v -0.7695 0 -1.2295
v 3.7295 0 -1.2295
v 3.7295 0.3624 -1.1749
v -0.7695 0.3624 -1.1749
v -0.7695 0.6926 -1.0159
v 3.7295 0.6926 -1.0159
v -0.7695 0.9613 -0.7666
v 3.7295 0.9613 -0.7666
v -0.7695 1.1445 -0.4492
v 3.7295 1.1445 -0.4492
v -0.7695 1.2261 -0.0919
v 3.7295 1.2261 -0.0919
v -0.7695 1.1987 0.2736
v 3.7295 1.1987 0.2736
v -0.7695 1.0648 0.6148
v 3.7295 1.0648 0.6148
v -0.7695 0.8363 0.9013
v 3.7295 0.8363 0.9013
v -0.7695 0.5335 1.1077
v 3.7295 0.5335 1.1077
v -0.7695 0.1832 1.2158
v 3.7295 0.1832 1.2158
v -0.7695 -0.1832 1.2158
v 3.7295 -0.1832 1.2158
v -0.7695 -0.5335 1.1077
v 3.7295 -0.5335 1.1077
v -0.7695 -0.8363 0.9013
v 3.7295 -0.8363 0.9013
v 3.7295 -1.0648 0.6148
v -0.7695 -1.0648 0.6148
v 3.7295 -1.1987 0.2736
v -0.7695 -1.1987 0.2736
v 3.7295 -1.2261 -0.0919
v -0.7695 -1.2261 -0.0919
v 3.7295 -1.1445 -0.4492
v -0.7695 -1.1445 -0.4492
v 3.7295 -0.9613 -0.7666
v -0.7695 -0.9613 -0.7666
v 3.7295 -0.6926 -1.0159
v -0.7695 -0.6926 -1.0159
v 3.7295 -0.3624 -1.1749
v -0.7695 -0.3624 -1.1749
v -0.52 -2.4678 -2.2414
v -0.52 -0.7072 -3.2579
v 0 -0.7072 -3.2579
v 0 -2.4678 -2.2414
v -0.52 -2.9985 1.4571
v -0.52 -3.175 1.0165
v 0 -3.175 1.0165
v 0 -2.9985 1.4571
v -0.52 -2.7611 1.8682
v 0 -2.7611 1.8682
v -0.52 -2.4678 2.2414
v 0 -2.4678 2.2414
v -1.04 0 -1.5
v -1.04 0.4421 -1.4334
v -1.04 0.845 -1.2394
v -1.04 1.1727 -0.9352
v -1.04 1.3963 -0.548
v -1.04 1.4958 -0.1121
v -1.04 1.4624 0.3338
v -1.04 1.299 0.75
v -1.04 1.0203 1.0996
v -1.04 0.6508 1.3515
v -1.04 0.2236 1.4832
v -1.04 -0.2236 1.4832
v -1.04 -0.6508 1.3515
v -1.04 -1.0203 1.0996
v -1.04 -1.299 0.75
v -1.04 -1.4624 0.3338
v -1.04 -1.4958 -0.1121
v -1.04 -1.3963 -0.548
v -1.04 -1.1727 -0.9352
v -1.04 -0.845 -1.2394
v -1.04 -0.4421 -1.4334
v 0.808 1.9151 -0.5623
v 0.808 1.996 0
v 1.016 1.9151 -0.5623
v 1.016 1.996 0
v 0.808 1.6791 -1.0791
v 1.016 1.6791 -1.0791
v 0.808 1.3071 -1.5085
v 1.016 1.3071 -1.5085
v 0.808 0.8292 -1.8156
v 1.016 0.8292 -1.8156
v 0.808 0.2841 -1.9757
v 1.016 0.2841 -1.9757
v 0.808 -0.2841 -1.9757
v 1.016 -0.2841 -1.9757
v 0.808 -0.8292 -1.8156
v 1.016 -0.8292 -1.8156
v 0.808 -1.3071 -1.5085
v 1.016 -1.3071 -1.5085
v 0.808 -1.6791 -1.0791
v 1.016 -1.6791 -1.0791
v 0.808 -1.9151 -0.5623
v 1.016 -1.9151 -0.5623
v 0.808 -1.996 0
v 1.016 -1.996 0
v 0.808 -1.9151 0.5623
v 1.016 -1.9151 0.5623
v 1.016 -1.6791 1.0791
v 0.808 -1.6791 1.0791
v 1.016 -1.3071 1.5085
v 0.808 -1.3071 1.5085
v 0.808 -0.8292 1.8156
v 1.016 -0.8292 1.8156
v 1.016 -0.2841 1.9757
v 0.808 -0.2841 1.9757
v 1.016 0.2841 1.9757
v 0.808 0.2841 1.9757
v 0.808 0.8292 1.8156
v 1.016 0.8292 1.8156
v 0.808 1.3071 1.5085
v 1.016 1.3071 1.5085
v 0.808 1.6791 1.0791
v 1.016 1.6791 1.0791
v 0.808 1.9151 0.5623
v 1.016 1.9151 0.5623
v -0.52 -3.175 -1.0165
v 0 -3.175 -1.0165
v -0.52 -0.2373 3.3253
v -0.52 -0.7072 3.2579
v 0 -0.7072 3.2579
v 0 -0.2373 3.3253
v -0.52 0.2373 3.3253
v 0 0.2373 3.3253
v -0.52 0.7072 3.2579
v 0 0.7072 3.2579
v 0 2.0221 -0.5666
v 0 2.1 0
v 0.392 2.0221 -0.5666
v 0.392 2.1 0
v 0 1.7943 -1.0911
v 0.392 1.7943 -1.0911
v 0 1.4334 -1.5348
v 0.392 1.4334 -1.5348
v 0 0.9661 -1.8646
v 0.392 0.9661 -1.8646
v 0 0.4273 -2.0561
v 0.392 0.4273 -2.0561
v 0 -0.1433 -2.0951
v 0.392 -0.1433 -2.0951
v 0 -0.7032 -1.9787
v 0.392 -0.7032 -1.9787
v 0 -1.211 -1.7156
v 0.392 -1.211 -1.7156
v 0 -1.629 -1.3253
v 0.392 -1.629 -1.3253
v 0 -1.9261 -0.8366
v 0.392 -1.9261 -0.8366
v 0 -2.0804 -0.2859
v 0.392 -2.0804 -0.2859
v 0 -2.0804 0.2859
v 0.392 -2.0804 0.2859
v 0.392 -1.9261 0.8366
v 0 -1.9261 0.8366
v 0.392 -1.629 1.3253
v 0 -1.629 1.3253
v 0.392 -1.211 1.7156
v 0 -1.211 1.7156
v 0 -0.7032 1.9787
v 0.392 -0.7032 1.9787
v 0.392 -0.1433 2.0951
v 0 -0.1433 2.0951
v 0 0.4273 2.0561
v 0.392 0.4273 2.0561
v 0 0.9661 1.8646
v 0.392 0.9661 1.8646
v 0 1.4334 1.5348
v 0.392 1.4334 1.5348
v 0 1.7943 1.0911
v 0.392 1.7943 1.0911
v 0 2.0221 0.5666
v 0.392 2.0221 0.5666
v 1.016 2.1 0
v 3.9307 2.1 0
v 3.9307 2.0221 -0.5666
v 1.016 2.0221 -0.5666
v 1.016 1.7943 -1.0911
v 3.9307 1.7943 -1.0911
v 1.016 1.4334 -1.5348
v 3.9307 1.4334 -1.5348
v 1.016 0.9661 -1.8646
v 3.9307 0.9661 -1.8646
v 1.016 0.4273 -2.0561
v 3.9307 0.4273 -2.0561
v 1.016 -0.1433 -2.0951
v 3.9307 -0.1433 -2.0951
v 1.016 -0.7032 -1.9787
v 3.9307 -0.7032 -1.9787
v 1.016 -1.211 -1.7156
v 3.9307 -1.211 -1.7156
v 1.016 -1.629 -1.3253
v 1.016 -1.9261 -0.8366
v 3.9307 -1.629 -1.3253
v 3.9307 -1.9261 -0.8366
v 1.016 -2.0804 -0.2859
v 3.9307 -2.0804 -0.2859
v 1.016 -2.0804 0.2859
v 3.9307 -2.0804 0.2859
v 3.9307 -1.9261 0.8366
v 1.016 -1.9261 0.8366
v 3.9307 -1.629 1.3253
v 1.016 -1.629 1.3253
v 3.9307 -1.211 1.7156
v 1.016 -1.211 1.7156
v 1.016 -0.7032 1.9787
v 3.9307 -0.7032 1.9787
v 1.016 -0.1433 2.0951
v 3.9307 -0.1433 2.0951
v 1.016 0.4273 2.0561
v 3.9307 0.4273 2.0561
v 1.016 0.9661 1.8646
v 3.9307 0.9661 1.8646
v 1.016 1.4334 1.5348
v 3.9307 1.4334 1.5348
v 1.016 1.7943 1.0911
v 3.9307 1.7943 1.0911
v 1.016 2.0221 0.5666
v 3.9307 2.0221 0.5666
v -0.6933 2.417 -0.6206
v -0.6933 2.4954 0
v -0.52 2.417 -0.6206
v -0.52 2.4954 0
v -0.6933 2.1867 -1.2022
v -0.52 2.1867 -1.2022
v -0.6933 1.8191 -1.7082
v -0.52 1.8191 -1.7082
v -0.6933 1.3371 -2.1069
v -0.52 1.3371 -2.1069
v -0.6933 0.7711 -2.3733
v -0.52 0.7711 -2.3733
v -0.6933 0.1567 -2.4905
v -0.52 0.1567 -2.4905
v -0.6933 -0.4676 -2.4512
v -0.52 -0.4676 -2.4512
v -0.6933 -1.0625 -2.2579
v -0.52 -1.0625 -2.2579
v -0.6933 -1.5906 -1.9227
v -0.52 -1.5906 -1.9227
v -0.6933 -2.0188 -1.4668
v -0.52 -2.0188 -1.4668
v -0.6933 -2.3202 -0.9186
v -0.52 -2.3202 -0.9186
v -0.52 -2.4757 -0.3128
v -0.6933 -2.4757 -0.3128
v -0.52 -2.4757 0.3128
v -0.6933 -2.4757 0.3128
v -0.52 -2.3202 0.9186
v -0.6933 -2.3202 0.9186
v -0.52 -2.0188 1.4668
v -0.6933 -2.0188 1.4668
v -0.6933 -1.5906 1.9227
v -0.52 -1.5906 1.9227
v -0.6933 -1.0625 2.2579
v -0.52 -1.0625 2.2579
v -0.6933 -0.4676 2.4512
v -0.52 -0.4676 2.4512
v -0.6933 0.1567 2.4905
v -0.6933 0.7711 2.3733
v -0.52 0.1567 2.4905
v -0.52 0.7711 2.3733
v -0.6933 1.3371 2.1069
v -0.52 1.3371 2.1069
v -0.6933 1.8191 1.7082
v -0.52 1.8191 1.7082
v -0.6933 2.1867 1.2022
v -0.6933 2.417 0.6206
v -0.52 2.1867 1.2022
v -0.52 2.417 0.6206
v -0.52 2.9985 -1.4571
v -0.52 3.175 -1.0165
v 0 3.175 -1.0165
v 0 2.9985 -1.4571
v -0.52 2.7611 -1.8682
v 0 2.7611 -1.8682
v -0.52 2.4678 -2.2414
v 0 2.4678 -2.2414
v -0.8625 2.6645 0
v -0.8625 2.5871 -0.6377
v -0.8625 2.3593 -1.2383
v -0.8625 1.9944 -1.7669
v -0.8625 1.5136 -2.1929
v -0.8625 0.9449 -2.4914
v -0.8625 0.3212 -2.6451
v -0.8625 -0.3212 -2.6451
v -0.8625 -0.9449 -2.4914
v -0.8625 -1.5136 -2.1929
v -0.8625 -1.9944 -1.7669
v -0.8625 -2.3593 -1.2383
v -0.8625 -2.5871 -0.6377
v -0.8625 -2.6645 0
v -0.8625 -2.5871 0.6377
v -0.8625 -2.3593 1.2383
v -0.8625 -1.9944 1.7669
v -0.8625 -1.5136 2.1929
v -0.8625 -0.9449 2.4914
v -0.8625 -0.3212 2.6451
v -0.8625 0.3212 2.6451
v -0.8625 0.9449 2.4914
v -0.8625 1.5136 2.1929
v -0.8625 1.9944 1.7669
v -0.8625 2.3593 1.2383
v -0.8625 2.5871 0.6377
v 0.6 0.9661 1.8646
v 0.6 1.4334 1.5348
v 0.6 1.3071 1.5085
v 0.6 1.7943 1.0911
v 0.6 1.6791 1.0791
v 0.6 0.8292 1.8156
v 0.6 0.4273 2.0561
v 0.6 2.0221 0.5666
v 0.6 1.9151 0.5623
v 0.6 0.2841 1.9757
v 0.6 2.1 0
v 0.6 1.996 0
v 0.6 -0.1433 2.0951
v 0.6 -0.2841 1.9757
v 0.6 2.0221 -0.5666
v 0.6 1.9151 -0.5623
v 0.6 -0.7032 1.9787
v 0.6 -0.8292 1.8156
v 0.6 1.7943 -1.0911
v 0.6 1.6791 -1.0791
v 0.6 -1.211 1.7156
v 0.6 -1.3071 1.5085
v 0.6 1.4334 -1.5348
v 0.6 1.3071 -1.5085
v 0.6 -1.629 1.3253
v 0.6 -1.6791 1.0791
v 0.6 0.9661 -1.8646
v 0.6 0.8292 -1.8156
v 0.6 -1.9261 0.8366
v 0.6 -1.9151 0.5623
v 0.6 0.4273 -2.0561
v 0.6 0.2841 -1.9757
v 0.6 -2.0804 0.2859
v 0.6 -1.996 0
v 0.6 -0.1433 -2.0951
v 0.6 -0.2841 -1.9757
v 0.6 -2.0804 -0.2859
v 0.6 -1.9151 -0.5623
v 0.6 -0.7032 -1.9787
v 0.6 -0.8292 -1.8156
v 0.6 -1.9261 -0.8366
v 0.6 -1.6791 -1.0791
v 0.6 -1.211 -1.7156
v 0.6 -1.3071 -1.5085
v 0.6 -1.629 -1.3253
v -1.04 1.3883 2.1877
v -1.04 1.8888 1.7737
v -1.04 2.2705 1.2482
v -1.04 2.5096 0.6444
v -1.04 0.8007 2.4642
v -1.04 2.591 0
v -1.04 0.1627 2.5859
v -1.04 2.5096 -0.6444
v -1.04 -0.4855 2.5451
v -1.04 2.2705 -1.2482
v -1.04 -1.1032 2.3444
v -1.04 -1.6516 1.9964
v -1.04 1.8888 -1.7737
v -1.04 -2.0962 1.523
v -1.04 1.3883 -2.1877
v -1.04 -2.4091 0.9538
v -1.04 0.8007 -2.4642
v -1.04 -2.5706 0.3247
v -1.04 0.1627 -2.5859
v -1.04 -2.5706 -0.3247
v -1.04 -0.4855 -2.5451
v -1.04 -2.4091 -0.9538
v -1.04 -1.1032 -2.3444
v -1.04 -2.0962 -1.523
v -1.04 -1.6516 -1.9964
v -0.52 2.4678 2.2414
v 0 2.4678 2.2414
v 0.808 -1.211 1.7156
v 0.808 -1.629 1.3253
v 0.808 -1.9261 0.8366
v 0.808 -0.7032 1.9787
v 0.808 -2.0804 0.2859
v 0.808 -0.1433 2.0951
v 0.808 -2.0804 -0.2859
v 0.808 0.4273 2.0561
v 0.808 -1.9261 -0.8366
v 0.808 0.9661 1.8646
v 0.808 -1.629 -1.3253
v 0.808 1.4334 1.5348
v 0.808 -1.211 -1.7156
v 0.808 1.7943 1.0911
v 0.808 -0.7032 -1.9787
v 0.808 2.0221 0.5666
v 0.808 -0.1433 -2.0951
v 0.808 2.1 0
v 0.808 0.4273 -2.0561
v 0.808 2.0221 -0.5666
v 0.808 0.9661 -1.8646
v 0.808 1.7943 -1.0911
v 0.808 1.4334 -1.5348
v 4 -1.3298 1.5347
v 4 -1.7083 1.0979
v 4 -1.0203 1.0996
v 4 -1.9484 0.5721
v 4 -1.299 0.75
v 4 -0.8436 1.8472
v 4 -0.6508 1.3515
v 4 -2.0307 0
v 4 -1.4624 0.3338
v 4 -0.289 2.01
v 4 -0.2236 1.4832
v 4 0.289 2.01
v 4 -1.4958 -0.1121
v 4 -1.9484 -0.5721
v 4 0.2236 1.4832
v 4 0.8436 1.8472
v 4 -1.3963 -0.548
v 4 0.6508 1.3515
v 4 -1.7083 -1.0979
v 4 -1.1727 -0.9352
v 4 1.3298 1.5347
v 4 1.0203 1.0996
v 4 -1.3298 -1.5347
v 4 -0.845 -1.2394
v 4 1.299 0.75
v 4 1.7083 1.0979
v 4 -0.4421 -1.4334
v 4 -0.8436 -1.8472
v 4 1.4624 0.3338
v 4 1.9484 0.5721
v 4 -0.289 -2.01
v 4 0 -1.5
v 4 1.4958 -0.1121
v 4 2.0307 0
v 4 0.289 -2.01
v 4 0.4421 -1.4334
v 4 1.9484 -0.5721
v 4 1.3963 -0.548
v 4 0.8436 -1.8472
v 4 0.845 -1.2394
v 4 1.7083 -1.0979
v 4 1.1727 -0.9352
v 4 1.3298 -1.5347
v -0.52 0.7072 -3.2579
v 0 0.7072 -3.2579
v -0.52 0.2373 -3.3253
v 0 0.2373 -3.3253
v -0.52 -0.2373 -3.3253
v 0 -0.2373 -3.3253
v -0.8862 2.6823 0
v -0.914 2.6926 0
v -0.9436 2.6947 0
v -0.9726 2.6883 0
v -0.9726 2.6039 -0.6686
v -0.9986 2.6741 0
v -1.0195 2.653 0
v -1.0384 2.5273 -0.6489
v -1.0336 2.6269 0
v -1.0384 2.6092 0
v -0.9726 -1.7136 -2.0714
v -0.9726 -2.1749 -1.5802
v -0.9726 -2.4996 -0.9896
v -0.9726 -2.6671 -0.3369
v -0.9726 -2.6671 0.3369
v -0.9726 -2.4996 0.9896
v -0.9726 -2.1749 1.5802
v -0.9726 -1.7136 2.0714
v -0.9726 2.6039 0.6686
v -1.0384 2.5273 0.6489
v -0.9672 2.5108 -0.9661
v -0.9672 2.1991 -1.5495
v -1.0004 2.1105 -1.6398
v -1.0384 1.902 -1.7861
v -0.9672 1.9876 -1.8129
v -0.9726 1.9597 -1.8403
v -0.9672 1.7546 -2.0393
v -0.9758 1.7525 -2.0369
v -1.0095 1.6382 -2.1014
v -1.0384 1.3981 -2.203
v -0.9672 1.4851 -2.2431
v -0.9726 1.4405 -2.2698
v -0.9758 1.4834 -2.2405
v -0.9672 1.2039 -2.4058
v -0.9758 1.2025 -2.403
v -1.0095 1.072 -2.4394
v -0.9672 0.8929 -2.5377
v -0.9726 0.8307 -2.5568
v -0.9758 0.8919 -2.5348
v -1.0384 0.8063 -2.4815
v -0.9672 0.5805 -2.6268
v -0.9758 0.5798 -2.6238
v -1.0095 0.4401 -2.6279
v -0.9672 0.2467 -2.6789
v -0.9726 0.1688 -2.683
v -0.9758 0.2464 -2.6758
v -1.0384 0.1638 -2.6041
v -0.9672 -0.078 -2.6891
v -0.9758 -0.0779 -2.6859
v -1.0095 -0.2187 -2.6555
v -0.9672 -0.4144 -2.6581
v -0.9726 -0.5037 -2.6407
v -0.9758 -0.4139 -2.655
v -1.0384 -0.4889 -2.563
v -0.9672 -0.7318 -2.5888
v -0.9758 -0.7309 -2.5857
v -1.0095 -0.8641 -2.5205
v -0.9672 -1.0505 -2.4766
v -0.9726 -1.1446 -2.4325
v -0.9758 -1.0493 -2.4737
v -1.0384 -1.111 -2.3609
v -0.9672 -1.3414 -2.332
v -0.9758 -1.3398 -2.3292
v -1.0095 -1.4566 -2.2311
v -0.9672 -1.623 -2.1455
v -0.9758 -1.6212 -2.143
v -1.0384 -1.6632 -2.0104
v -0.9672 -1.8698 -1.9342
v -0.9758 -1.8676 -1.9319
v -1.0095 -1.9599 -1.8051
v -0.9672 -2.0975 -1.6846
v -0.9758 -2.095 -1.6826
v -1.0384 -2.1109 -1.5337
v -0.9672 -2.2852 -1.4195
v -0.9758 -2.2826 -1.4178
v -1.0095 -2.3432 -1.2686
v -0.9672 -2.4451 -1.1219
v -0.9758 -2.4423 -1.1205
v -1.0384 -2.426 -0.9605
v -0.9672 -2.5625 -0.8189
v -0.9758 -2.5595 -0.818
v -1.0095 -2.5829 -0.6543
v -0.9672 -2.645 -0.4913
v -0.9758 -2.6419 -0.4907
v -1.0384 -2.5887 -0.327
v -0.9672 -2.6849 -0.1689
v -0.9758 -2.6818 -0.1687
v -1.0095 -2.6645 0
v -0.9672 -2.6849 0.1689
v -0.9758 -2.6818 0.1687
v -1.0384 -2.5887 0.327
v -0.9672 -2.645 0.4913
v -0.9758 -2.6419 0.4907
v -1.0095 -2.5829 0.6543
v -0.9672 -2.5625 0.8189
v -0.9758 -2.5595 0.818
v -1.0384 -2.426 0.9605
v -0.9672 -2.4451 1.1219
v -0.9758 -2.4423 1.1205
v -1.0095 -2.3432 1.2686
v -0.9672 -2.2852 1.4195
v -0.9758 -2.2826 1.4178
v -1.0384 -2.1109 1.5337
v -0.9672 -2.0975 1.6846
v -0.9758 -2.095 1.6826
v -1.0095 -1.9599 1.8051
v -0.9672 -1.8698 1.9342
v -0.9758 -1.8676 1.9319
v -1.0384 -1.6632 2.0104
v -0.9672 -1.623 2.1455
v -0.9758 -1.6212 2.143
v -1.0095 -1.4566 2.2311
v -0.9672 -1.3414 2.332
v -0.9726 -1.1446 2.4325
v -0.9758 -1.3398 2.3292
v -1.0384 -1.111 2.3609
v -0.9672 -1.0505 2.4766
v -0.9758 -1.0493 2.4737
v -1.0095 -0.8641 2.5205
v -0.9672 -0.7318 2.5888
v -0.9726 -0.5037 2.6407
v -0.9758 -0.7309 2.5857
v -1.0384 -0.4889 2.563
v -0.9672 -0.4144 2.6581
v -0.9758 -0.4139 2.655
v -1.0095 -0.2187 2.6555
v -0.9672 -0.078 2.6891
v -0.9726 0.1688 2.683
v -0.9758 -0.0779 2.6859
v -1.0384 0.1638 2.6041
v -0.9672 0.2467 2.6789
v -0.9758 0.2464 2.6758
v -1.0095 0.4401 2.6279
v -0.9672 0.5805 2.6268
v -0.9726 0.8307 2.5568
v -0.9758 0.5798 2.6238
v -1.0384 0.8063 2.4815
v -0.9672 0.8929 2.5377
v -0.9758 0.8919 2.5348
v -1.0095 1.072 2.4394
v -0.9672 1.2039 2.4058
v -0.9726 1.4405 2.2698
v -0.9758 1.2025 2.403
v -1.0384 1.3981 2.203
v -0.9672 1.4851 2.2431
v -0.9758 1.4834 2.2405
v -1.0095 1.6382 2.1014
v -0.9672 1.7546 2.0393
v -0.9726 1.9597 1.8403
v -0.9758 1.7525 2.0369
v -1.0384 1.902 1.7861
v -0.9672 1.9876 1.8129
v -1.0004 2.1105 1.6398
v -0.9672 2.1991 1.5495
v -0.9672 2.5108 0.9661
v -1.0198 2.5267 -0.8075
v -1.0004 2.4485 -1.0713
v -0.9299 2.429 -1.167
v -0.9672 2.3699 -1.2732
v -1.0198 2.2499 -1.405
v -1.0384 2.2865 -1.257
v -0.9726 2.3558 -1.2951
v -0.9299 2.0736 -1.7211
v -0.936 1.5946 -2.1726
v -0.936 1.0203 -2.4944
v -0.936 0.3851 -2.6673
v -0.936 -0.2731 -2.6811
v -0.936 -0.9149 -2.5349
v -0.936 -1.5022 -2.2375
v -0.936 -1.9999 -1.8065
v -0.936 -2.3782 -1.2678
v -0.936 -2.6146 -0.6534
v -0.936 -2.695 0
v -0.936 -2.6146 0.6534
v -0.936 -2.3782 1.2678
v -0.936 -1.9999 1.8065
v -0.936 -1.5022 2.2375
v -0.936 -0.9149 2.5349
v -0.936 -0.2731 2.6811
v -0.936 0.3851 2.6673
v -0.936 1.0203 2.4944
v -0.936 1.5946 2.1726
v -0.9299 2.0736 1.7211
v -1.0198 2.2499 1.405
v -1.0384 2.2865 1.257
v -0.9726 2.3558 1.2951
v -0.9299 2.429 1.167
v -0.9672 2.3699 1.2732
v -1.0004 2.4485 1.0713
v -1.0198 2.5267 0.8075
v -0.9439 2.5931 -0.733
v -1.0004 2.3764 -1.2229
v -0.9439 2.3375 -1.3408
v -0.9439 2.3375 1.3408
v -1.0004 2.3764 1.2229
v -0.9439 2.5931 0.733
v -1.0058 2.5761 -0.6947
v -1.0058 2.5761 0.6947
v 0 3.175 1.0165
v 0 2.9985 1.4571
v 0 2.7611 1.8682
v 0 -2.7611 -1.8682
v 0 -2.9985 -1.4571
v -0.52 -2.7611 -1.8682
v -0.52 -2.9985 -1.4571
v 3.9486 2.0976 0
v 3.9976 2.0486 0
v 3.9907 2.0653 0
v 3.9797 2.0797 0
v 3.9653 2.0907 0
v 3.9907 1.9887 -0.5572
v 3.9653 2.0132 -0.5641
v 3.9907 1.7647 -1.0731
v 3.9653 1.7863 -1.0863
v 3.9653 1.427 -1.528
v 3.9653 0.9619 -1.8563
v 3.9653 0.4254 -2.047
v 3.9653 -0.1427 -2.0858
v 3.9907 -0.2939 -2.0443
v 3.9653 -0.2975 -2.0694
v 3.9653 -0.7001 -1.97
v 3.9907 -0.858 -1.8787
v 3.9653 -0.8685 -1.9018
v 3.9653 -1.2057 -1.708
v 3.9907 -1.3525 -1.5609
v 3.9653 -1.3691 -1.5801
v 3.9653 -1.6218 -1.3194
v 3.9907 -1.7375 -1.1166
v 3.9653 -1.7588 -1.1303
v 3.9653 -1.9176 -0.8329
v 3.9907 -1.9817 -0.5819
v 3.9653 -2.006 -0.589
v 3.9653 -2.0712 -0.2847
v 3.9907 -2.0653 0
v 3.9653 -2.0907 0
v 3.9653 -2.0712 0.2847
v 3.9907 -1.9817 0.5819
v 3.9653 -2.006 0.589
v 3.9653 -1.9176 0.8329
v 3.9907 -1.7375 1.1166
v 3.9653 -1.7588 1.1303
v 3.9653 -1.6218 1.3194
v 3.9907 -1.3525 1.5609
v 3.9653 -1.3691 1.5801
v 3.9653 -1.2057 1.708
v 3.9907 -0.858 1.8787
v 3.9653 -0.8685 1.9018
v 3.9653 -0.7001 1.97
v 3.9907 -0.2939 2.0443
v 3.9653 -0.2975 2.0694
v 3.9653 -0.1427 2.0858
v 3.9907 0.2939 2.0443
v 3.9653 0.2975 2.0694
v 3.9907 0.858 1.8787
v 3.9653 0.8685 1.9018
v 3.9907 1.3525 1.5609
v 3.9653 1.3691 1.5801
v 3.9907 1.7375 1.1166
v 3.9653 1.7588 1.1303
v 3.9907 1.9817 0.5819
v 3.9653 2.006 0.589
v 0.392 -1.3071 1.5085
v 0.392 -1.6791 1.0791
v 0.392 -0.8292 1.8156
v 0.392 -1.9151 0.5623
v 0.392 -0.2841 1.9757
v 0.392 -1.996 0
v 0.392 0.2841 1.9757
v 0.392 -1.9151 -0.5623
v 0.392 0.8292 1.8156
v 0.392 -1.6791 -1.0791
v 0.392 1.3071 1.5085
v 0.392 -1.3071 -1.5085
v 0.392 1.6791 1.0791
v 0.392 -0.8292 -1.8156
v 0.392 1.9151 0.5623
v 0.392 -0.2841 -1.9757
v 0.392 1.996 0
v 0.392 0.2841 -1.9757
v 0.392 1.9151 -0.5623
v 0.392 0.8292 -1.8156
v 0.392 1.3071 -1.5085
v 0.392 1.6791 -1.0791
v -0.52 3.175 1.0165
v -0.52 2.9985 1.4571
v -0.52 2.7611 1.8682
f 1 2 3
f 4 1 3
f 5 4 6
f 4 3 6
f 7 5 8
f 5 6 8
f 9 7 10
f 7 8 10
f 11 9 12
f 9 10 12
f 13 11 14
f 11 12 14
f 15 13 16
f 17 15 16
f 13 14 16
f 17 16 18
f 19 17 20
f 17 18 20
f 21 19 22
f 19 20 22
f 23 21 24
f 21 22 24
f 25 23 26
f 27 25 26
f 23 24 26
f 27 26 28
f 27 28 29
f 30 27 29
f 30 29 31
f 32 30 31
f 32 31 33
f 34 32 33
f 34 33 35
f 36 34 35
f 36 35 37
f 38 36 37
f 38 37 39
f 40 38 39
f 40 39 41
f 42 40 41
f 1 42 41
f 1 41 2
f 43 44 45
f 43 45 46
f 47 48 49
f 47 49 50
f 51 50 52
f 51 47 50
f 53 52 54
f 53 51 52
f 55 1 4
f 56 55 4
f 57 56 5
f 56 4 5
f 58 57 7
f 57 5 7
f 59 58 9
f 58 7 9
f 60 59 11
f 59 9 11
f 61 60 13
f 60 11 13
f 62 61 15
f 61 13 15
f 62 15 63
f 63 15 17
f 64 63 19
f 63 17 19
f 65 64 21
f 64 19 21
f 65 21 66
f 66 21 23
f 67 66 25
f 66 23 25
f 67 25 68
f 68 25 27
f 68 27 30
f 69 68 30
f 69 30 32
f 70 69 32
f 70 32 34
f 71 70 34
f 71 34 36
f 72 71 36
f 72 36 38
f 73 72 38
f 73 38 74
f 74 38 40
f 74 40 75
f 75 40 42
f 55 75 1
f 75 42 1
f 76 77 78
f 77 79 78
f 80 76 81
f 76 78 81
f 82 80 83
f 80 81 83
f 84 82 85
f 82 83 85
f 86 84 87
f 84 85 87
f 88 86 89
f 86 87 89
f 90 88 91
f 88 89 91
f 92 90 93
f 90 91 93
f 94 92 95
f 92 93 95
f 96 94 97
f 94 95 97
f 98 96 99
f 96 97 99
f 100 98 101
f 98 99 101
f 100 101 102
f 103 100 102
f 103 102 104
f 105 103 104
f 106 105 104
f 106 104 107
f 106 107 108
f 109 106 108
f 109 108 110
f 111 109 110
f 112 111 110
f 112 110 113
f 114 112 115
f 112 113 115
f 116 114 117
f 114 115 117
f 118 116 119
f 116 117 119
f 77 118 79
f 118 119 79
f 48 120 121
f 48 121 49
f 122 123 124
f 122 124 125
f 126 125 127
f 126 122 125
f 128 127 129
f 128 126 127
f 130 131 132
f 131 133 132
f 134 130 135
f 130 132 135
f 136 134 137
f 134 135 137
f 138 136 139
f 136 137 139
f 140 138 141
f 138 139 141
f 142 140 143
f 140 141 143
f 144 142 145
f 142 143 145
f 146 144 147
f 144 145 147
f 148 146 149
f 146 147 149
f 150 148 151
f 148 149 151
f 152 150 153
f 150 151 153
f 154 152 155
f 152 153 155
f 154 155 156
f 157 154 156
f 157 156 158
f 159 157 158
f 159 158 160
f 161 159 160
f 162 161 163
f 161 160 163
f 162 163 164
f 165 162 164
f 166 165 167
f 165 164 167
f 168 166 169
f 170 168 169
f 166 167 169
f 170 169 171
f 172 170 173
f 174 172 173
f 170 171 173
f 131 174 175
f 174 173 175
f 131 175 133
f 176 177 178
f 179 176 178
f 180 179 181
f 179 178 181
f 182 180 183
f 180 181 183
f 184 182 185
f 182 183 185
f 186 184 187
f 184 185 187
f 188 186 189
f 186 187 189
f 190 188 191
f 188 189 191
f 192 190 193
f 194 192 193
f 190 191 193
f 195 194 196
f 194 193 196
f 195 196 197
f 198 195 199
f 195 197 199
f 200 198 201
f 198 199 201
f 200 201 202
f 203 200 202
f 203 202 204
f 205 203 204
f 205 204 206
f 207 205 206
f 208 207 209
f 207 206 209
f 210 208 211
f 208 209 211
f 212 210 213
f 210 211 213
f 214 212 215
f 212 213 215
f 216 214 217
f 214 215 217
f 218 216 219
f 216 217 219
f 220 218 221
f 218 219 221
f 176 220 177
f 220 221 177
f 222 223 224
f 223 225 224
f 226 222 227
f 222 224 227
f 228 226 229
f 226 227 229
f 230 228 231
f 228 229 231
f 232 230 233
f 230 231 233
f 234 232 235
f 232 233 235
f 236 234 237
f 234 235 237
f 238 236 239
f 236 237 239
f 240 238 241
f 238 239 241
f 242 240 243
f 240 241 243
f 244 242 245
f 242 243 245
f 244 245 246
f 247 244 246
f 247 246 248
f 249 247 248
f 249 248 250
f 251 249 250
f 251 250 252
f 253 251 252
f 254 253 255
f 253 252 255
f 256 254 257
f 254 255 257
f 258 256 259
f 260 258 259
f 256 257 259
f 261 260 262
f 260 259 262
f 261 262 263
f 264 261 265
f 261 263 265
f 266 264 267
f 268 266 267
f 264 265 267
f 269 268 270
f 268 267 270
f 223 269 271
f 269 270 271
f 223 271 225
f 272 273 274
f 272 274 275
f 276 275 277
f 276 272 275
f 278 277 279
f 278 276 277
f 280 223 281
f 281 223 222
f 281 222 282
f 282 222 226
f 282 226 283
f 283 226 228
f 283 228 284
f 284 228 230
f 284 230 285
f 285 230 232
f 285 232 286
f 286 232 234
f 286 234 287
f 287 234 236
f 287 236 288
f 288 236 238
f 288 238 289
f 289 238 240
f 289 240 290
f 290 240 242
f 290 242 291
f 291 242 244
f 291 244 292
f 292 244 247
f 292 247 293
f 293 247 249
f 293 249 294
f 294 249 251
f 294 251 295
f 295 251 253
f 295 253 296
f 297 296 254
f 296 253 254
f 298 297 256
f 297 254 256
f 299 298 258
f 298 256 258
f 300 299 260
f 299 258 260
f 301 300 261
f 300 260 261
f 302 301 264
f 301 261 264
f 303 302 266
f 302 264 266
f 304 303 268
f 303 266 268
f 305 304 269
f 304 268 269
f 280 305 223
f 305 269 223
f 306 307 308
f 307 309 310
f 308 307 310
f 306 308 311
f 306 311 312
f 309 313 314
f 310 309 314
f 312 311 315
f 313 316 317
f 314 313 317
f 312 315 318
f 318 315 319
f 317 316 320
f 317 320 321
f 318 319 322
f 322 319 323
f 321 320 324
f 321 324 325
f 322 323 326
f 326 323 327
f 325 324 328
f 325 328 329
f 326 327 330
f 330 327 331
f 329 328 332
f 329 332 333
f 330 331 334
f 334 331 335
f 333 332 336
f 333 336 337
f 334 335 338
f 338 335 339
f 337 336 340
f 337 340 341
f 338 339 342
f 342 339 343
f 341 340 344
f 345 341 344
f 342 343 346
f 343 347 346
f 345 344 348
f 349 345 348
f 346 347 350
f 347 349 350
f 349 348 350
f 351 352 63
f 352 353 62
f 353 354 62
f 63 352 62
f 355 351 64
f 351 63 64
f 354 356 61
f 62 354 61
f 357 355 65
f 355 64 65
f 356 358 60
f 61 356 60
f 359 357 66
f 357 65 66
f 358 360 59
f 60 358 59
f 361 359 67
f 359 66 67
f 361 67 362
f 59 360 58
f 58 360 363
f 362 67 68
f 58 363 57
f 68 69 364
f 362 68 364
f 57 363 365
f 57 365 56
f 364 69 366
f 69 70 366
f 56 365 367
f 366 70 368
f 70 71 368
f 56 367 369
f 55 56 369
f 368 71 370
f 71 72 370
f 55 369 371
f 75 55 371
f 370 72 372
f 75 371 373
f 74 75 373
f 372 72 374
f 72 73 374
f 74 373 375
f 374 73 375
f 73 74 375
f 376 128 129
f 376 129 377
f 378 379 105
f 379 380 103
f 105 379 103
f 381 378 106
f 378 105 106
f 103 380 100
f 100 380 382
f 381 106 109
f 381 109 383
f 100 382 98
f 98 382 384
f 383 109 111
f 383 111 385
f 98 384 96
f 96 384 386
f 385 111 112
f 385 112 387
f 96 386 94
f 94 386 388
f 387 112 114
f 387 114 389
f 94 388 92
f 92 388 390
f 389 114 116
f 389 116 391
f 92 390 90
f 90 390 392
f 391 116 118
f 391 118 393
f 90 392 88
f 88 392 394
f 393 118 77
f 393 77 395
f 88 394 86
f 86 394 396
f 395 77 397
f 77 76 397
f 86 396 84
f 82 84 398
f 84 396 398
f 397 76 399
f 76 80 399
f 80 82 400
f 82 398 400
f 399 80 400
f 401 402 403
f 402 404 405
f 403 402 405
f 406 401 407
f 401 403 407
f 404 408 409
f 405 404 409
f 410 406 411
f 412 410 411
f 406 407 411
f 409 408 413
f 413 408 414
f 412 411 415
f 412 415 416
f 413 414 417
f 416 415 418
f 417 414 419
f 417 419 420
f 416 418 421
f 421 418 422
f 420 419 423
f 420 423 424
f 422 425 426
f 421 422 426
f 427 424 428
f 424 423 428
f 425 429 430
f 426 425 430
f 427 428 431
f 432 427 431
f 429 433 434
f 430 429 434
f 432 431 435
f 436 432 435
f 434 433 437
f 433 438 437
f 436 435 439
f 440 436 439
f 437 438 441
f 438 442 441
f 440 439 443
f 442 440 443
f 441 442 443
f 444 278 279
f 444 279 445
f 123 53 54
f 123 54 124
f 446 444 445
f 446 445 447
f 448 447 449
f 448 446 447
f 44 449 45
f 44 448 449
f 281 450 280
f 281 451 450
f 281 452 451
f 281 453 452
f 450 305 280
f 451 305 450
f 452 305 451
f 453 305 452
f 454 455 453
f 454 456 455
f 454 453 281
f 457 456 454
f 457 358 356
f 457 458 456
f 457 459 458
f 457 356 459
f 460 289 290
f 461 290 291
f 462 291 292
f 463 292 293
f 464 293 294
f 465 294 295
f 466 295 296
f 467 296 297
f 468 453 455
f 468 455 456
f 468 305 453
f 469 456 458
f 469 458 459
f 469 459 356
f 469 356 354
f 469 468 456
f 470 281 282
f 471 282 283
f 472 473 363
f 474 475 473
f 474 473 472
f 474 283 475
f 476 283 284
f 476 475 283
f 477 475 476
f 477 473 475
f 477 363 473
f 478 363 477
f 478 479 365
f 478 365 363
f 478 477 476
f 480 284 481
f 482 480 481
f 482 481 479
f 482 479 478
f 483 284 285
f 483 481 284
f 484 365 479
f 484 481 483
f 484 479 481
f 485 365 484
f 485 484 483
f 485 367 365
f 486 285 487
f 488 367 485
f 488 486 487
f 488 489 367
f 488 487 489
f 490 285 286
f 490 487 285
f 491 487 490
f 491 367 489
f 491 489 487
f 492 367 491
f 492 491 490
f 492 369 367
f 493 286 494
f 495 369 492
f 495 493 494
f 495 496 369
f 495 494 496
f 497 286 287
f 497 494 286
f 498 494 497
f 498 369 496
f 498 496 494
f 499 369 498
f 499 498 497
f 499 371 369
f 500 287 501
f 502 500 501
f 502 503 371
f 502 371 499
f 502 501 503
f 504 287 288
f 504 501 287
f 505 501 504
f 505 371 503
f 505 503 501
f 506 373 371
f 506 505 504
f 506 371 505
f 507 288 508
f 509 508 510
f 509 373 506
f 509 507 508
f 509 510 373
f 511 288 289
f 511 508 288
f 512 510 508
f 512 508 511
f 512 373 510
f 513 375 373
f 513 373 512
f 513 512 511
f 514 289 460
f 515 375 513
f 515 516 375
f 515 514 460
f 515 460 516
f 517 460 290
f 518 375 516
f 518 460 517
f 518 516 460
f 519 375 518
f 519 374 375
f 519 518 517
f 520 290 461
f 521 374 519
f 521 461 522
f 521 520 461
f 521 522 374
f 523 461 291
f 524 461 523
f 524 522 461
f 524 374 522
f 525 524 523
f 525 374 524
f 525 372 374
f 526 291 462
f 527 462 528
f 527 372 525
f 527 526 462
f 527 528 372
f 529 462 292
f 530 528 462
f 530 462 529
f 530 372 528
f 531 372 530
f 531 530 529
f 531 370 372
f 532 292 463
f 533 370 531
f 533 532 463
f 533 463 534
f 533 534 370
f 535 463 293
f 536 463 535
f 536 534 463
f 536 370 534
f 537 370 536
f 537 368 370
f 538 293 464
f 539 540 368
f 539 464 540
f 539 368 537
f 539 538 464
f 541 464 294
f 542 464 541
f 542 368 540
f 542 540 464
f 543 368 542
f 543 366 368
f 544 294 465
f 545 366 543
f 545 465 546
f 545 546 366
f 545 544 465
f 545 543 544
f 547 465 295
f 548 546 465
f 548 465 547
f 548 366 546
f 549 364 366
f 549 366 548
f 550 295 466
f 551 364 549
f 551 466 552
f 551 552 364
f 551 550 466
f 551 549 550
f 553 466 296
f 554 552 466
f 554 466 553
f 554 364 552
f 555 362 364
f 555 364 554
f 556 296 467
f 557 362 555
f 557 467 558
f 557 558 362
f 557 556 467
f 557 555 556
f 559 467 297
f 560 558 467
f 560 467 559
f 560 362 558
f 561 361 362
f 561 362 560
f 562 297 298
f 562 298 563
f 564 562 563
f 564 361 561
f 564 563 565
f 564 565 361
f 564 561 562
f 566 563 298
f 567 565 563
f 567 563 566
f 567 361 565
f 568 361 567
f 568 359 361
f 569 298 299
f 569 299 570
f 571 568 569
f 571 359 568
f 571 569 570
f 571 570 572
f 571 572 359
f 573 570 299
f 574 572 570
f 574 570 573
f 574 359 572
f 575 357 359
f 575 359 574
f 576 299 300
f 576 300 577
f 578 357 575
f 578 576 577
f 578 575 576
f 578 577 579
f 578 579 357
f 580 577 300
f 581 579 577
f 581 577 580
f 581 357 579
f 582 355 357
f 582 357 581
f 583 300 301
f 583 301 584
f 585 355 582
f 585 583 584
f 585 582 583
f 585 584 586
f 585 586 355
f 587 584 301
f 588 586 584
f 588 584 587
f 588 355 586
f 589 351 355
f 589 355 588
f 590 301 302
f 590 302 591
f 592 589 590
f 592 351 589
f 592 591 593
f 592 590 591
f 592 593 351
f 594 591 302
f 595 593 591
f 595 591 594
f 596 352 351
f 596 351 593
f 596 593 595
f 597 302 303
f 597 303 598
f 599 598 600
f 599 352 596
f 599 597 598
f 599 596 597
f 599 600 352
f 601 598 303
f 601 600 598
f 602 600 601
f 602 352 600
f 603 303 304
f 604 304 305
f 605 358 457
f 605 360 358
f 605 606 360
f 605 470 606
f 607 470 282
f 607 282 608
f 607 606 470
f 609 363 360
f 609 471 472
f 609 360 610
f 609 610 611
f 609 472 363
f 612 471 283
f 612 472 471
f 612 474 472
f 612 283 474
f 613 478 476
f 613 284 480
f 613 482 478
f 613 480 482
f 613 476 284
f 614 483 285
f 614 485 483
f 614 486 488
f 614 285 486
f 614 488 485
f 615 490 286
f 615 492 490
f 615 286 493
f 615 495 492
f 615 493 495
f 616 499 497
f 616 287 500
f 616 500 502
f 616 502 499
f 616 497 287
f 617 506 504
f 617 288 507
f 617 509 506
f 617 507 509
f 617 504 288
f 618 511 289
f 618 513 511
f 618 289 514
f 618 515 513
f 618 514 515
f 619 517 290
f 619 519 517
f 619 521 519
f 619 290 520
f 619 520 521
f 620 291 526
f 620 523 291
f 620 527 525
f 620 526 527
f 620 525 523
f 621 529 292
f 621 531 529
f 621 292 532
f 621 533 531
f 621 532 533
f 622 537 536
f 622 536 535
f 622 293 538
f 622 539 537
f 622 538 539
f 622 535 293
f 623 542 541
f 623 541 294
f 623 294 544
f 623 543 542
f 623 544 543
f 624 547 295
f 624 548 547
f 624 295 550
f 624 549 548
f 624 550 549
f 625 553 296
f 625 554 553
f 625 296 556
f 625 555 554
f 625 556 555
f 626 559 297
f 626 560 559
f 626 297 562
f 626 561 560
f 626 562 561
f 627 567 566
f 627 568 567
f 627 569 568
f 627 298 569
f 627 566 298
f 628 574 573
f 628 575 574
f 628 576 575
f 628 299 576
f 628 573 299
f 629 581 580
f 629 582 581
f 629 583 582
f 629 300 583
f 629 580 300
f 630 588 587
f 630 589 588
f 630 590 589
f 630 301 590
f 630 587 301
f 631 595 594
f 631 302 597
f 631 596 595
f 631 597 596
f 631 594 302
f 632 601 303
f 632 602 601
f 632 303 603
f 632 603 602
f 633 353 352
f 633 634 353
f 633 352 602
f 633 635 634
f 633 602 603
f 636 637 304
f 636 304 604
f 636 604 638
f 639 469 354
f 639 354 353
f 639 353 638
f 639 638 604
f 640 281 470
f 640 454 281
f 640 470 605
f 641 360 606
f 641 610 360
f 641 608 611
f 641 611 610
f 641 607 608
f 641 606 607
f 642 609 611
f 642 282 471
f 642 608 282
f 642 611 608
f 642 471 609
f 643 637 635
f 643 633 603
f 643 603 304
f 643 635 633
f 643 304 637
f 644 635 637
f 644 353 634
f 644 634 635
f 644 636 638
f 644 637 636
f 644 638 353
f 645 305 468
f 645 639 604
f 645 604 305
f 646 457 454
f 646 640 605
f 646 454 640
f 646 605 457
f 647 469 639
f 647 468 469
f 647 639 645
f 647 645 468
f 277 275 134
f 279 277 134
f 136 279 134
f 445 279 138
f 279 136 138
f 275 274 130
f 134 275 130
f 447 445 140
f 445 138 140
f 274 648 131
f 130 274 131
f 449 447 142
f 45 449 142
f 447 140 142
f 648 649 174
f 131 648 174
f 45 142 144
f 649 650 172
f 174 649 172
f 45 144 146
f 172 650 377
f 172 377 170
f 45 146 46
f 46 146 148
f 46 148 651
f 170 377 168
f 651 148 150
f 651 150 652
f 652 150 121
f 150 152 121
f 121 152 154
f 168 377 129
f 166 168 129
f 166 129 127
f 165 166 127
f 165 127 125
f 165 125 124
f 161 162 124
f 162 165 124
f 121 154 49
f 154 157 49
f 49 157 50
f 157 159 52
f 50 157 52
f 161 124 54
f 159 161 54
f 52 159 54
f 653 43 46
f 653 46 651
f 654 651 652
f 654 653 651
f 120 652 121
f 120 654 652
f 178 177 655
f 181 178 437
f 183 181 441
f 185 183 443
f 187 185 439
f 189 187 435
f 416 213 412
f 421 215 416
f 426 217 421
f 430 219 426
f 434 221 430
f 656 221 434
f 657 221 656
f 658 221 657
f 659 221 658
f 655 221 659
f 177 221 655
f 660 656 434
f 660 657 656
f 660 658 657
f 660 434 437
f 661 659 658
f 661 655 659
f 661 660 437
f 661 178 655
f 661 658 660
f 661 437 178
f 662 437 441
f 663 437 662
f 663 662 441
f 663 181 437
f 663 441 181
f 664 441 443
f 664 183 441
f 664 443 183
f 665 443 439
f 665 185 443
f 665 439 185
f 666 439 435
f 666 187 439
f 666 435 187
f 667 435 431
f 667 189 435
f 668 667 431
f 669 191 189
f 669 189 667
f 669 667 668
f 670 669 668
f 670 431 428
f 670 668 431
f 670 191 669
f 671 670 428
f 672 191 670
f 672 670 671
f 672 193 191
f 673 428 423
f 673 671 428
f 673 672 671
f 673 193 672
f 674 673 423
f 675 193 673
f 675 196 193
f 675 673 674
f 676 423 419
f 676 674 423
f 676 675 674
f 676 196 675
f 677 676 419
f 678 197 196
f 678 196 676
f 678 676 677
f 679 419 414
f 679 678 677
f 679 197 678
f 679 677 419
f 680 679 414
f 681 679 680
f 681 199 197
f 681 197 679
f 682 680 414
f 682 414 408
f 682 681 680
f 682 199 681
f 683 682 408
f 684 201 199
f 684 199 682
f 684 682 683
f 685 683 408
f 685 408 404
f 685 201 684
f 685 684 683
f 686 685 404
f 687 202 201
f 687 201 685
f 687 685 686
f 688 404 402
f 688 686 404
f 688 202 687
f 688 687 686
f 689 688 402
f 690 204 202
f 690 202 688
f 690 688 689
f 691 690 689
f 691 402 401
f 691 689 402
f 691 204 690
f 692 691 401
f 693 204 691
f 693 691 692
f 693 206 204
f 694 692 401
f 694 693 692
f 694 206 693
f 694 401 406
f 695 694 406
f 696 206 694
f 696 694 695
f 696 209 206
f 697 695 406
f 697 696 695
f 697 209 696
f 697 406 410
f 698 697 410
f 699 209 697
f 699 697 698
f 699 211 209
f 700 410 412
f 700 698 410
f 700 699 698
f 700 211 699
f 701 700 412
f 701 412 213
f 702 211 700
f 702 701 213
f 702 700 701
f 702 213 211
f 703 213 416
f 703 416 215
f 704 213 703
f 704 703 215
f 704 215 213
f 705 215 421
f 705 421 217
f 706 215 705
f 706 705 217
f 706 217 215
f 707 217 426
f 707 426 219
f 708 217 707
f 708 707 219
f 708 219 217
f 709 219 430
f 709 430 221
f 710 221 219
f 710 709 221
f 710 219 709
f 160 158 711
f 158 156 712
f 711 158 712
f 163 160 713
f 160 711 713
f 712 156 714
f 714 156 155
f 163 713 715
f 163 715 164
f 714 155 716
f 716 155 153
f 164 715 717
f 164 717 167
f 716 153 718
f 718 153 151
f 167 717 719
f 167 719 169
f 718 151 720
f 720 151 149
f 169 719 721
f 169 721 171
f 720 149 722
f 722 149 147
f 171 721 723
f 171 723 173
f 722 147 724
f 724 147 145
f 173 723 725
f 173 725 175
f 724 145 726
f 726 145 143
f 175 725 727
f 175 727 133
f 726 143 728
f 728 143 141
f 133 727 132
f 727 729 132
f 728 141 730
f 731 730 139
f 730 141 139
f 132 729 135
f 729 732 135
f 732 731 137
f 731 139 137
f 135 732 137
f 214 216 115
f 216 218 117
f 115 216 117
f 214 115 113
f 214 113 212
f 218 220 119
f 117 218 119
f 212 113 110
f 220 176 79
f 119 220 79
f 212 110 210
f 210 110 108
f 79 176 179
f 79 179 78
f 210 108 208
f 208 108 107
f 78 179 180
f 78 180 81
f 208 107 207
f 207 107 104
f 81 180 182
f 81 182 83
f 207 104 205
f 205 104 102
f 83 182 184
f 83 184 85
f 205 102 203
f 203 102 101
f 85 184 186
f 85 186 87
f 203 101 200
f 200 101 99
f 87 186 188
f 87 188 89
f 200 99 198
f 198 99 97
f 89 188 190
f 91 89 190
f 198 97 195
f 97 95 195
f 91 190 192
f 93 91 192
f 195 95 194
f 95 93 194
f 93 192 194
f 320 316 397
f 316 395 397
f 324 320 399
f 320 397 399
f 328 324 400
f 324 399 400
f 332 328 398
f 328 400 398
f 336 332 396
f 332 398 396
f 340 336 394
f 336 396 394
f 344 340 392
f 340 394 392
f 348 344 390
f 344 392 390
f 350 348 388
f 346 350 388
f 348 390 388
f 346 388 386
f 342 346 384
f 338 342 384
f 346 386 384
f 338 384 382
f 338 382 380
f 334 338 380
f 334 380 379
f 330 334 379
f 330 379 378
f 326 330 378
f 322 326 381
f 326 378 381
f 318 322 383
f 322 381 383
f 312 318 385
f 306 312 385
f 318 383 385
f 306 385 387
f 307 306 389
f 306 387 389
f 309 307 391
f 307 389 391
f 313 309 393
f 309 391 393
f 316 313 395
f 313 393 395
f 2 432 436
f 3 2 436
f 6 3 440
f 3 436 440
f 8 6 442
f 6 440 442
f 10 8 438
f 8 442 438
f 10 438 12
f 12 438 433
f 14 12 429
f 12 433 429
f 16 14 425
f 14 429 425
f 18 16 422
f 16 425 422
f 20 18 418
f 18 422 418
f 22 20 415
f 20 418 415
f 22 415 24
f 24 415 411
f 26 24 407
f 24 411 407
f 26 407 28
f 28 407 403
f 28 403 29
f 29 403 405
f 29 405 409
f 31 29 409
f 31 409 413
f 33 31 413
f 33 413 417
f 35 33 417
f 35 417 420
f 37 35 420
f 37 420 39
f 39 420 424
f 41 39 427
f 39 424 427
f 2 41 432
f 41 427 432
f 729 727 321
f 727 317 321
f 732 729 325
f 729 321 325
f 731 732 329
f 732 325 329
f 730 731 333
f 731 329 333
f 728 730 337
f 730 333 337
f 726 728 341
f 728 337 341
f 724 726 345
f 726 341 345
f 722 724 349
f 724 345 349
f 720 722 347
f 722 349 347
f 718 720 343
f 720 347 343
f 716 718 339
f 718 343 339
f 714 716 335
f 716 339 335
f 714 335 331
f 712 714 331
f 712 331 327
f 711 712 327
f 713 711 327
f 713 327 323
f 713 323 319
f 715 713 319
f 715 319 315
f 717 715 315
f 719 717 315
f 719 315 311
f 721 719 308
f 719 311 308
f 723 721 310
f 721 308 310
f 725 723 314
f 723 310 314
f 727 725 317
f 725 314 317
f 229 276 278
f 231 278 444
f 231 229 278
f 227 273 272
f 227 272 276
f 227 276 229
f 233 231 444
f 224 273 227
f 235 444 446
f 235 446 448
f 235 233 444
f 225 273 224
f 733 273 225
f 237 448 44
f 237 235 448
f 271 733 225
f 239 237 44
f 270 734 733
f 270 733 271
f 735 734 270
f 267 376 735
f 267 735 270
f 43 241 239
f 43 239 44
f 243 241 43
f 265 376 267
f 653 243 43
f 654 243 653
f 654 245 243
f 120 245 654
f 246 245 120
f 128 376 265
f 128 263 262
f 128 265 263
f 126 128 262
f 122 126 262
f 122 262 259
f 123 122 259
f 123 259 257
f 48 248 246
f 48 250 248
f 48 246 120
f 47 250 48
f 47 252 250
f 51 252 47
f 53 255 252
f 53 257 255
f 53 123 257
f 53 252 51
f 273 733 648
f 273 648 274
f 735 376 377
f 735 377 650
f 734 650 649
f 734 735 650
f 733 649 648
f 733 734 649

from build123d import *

# Parameters (mm, degrees)
BOSS_EXTRUDE1_DEPTH      = 0.52
M2_CLEARANCE_HOLE1_D     = 2.459
M2_CLEARANCE_HOLE1_DEPTH = 5.04
CHAMFER1_SIZE            = 0.2705
FILLET1_R                = 0.069333333


with BuildPart() as part:
    # Sketch1 → Boss-Extrude1 (new body)
    with BuildSketch(Plane(origin=(-0.52, 0, 0), x_dir=(0, -1, 0), z_dir=(-1, 0, 0))):
        with BuildLine():
            Line((-3.175, 1.016495973), (-3.175, -1.016495973))
            ThreePointArc((-3.175, -1.016495973), (-2.88711219, -1.666875), (-2.467811335, -2.241382671))
            Line((-2.467811335, -2.241382671), (-0.707188665, -3.257878643))
            ThreePointArc((-0.707188665, -3.257878643), (0, -3.33375), (0.707188665, -3.257878643))
            Line((0.707188665, -3.257878643), (2.467811335, -2.241382671))
            ThreePointArc((2.467811335, -2.241382671), (2.88711219, -1.666875), (3.175, -1.016495973))
            Line((3.175, -1.016495973), (3.175, 1.016495973))
            ThreePointArc((3.175, 1.016495973), (2.88711219, 1.666875), (2.467811335, 2.241382671))
            Line((2.467811335, 2.241382671), (0.707188665, 3.257878643))
            ThreePointArc((0.707188665, 3.257878643), (0, 3.33375), (-0.707188665, 3.257878643))
            Line((-0.707188665, 3.257878643), (-2.467811335, 2.241382671))
            ThreePointArc((-2.467811335, 2.241382671), (-2.88711219, 1.666875), (-3.175, 1.016495973))
        make_face()
    extrude(amount=-BOSS_EXTRUDE1_DEPTH)

    # Sketch2 → Revolve1 (revolve)
    with BuildSketch(Plane(origin=(0, 0, 0), x_dir=(-1, 0, 0), z_dir=(0, 0, -1))):
        with BuildLine():
            Line((0.52, 2.495411544), (0.52, 0))
            Line((0.52, 0), (1.04, 0))
            Line((1.04, 0), (1.04, 2.591))
            add(Edge.make_bspline(
                [(0.862460895, 2.664539105), (0.87069167, 2.672769881), (0.880457009, 2.679693108), (0.890948238, 2.684735472), (0.901439467, 2.689777836), (0.912945949, 2.693078411), (0.924514825, 2.694363876), (0.936083702, 2.69564934), (0.948034058, 2.694955148), (0.959376279, 2.692338786), (0.9707185, 2.689722424), (0.981765419, 2.68511173), (0.991602235, 2.678888517), (1.001439051, 2.672665304), (1.010337076, 2.664657929), (1.017559461, 2.655529485), (1.024781845, 2.646401041), (1.030527791, 2.635899755), (1.034321475, 2.624895242), (1.038055125, 2.614064874), (1.04, 2.602455872), (1.04, 2.591)],
                knots=[0, 0, 0, 0, 3.492e-05, 3.492e-05, 3.492e-05, 6.984e-05, 6.984e-05, 6.984e-05, 0.000104761, 0.000104761, 0.000104761, 0.000139681, 0.000139681, 0.000139681, 0.000174601, 0.000174601, 0.000174601, 0.000209521, 0.000209521, 0.000209521, 0.000243873, 0.000243873, 0.000243873, 0.000243873], degree=3))
            Line((0.862460895, 2.664539105), (0.693333333, 2.495411544))
            Line((0.693333333, 2.495411544), (0.52, 2.495411544))
        make_face()
    revolve(axis=Axis((-0.52, 0, 0), (-1, 0, 0)))

    # Sketch3 → Revolve2 (revolve)
    with BuildSketch(Plane(origin=(0, 0, 0), x_dir=(-1, 0, 0), z_dir=(0, 0, -1))):
        Polygon((-4, 2.1), (-4, 0), (0, 0), (0, 2.1), (-0.392, 2.1), (-0.392, 1.996), (-0.6, 1.996), (-0.6, 2.1), (-0.808, 2.1), (-0.808, 1.996), (-1.016, 1.996), (-1.016, 2.1), align=None)
    revolve(axis=Axis((4, 0, 0), (-1, 0, 0)))

    # M2 Clearance Hole1
    with Locations(Plane.ZY.offset(1.04)):
        with Locations((0, 0)):
            Hole(M2_CLEARANCE_HOLE1_D / 2, depth=M2_CLEARANCE_HOLE1_DEPTH)

    # Chamfer1
    chamfer1_edges = [part.edges().sort_by_distance(p)[0] for p in [
        (-1.04, 0, 1.2295),
        (4, 0, 1.2295),
    ]]
    chamfer(chamfer1_edges, length=CHAMFER1_SIZE)

    # Fillet1
    fillet1_edges = [part.edges().sort_by_distance(p)[0] for p in [
        (4, -2.1, 0),
    ]]
    fillet(fillet1_edges, radius=FILLET1_R)


solid = part.part
